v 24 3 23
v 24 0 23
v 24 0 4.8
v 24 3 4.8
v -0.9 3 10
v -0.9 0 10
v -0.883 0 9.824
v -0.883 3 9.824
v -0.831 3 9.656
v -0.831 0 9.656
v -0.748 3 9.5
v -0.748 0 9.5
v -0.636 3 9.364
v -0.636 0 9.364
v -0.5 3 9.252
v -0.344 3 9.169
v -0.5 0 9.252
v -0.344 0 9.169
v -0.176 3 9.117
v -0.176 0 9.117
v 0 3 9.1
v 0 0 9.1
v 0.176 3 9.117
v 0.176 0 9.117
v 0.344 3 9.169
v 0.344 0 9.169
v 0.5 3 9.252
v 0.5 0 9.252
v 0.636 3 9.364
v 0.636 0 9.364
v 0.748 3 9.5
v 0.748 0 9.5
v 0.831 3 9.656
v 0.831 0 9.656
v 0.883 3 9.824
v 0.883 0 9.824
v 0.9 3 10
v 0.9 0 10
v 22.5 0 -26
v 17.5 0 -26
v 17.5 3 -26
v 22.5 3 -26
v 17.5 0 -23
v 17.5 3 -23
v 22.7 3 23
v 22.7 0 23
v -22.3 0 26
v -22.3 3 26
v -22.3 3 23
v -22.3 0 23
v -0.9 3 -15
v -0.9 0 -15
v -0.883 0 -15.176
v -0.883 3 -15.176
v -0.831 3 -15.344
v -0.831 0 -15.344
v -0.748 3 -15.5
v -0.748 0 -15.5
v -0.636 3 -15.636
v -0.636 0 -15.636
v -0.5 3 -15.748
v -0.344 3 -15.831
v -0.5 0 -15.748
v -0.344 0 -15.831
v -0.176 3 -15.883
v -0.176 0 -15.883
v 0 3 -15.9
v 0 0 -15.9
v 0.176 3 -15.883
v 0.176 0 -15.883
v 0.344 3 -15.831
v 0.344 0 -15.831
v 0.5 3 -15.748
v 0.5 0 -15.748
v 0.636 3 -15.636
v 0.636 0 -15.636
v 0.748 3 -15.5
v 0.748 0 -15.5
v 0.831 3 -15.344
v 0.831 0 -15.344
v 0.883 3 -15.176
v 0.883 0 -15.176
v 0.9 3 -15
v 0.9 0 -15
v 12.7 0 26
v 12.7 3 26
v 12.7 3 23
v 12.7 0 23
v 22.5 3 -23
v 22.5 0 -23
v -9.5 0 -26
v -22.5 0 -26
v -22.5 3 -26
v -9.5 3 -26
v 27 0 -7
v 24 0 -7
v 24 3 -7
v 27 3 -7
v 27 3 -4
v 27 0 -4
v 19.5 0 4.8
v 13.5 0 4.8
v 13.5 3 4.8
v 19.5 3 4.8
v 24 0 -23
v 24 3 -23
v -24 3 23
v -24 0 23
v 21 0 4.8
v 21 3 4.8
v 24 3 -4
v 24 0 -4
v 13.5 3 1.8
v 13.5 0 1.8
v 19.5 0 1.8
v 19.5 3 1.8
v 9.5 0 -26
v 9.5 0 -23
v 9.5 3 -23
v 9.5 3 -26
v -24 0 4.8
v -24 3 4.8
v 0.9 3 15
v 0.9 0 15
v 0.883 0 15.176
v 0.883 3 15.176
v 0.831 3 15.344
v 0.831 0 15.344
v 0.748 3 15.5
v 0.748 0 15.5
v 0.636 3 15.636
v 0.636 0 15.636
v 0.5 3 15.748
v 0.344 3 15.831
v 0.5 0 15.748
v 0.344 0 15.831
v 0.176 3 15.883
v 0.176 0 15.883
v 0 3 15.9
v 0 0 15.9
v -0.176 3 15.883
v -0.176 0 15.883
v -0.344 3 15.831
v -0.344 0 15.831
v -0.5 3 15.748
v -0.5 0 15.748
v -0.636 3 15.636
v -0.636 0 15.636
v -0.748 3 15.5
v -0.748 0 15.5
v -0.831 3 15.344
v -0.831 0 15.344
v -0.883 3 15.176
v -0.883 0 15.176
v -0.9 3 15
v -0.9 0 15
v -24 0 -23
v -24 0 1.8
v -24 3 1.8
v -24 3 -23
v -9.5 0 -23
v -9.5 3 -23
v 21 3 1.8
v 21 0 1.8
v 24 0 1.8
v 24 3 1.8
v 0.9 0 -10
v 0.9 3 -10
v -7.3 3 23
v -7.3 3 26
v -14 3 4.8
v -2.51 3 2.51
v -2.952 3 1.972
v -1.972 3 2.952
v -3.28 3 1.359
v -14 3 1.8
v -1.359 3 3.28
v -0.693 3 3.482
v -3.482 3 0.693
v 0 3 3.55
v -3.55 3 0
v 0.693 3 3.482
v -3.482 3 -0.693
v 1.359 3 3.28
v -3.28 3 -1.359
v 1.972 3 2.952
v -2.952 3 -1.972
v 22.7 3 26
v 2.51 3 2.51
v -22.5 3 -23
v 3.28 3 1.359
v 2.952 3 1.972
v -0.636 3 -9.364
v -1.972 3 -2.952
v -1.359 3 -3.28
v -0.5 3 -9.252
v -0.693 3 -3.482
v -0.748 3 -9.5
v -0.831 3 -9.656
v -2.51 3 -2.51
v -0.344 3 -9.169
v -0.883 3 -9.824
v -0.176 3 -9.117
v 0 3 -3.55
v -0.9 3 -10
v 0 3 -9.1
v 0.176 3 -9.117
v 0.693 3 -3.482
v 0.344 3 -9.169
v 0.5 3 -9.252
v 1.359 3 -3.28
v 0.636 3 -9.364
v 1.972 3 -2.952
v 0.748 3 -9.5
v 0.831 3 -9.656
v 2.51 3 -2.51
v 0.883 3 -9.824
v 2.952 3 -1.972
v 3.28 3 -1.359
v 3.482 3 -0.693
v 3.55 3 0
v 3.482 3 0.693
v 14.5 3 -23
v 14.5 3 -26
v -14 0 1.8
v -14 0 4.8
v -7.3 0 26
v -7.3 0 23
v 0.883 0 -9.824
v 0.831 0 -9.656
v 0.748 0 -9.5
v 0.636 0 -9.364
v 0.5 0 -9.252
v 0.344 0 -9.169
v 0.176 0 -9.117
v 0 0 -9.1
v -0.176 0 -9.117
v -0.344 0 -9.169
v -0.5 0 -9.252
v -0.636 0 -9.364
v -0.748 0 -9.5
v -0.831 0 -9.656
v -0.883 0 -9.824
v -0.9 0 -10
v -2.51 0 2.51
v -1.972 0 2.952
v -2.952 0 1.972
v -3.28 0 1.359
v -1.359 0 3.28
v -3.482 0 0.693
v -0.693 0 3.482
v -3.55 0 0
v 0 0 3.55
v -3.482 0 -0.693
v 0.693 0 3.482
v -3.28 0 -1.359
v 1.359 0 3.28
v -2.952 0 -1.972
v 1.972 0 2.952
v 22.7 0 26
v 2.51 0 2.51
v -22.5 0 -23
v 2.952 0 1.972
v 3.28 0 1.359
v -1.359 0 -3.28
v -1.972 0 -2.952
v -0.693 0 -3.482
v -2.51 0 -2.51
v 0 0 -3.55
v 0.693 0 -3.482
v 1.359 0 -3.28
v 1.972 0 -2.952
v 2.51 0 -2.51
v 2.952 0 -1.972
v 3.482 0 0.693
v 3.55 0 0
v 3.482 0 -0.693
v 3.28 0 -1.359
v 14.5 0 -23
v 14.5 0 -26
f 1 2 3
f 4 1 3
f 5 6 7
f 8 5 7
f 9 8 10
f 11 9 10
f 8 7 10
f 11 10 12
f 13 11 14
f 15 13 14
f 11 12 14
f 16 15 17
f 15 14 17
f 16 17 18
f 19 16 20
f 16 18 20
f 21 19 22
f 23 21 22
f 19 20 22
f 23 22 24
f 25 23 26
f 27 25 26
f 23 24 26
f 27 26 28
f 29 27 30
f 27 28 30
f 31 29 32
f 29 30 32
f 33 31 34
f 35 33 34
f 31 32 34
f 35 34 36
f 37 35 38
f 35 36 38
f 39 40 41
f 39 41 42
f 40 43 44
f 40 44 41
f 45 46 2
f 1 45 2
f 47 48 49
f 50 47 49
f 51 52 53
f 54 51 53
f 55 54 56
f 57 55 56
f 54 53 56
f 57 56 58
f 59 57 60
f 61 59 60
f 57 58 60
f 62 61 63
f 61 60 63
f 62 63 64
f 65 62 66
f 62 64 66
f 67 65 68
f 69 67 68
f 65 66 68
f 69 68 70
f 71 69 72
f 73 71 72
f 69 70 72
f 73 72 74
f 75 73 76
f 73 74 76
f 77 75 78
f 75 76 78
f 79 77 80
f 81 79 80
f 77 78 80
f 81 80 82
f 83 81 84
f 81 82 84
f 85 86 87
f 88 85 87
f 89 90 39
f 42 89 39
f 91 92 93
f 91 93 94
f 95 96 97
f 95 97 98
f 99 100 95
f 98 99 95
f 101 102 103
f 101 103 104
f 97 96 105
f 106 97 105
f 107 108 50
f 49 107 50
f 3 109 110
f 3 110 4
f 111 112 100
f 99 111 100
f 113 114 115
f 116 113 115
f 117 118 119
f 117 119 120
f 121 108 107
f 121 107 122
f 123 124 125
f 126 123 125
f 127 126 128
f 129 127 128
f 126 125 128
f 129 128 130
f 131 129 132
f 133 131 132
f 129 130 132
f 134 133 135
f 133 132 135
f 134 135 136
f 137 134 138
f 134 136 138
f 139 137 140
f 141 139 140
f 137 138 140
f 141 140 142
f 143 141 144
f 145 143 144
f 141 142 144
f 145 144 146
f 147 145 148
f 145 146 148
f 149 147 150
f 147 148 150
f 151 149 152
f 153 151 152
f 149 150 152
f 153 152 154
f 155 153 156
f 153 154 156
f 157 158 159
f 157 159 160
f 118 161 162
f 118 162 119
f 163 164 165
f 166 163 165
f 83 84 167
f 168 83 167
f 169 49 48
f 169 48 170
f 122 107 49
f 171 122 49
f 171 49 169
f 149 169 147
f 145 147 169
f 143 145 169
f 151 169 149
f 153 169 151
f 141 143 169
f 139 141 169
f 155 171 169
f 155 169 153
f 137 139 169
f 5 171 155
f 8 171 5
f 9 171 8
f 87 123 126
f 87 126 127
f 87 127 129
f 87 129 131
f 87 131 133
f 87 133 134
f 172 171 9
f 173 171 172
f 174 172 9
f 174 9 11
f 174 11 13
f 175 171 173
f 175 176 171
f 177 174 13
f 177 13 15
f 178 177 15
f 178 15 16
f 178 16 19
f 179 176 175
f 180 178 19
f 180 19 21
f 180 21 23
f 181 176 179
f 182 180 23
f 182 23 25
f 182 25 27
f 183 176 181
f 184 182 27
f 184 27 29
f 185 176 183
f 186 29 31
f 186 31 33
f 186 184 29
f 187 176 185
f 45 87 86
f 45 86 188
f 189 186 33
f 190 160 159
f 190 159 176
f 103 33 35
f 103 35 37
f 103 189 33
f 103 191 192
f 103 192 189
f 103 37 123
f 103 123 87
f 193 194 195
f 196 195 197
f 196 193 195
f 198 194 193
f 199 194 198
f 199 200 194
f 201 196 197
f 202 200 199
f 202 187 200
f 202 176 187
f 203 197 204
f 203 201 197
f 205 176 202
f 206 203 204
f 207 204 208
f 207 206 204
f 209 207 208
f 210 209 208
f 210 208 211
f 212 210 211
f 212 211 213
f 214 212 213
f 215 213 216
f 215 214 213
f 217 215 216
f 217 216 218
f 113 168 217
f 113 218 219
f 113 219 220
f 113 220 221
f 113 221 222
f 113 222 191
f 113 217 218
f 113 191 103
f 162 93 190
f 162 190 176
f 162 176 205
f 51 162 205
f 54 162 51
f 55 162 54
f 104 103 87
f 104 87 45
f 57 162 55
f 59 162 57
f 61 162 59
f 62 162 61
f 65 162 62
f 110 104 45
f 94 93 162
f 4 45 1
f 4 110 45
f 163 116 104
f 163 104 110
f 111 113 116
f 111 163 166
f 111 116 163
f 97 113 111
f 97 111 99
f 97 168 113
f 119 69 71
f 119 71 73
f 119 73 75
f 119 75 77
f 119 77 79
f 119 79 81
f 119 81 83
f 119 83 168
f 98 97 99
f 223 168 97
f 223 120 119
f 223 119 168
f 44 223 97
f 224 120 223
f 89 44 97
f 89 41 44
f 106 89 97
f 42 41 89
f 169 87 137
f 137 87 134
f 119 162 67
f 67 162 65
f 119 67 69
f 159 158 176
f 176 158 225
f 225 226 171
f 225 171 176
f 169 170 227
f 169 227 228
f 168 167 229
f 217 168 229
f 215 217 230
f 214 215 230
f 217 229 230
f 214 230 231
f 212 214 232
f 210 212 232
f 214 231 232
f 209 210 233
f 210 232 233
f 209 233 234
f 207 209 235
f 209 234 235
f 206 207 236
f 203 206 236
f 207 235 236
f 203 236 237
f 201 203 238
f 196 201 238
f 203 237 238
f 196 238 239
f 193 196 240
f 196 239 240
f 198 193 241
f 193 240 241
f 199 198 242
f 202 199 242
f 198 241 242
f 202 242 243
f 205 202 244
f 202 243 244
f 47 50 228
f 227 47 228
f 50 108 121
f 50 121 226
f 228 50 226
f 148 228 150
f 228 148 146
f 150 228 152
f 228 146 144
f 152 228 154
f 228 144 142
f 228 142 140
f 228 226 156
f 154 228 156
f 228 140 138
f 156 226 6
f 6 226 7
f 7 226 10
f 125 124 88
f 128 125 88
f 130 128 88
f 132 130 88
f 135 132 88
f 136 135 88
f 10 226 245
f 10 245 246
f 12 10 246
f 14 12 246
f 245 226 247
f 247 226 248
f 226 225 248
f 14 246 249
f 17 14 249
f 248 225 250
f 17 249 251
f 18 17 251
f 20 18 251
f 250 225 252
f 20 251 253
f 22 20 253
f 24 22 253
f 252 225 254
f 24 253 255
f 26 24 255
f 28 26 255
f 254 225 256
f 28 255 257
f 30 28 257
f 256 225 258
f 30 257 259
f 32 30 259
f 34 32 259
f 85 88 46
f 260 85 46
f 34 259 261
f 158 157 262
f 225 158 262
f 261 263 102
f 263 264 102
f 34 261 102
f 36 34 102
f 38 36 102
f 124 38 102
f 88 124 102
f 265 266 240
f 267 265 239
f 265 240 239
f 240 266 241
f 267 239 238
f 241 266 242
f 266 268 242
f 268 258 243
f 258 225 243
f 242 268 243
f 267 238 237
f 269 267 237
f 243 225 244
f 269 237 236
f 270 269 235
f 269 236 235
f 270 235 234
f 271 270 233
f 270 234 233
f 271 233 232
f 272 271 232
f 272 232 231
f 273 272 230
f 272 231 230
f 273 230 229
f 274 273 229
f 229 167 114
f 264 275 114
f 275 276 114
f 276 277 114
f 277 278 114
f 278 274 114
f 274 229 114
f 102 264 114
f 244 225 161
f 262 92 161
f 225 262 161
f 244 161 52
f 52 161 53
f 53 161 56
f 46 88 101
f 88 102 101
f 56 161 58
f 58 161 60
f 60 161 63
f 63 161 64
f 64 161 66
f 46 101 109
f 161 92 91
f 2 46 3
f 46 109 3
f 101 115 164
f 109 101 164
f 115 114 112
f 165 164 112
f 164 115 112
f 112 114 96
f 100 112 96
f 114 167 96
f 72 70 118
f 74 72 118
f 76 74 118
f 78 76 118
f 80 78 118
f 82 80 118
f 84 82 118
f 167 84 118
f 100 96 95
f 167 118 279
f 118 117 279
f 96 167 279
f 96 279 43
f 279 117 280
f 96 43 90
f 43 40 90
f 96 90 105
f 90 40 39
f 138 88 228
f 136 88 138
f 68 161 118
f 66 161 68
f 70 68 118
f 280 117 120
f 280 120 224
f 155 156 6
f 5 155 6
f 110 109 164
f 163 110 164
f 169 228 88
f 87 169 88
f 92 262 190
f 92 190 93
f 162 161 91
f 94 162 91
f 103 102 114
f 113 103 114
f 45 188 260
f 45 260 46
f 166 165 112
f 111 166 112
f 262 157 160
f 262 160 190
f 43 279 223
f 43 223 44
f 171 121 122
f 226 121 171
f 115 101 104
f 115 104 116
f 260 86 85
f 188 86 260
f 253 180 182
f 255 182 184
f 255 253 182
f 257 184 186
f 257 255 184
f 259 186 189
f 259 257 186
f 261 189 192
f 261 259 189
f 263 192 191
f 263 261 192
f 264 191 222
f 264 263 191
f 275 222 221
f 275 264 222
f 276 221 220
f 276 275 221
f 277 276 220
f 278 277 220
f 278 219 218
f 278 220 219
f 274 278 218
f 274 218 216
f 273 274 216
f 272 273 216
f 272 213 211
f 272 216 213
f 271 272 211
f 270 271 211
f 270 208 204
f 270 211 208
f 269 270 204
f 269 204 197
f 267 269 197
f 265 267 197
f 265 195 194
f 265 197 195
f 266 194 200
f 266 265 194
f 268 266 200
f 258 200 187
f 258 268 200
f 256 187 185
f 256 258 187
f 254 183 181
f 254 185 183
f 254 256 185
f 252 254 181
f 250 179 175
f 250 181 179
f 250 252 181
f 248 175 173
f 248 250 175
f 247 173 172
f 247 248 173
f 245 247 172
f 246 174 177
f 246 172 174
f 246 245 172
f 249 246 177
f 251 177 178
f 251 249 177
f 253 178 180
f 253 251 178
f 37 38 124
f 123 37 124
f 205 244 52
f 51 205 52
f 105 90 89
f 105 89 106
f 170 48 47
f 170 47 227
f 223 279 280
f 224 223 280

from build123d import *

# Parameters (mm, degrees)
ESBO_O1_W                = 48
ESBO_O1_H                = 46
RESSALTO_EXTRUS_O1_DEPTH = 3
ESBO_O6_W                = 3
ESBO_O6_H                = 3
RESSALTO_EXTRUS_O4_DEPTH = 3
ESBO_O2_R                = 3.55
CORTE_EXTRUS_O1_DEPTH    = 36.594943461
CORTE_EXTRUS_O2_DEPTH    = 36.594943461
PADR_OCIRCULAR1_COUNT    = 2
ESBO_O4_W                = 10
ESBO_O4_H                = 3
ESBO_O4_W_2              = 15
RESSALTO_EXTRUS_O2_DEPTH = 3
ESBO_O5_W                = 5
ESBO_O5_H                = 3
ESBO_O5_W_2              = 13
RESSALTO_EXTRUS_O3_DEPTH = 3
ESBO_O7_W                = 3
ESBO_O7_H                = 3
ESBO_O7_W_2              = 6
ESBO_O7_W_3              = 10
CORTE_EXTRUS_O3_DEPTH    = 38.603191354


with BuildPart() as part:
    # Esboço1 → Ressalto-extrusão1 (new body)
    with BuildSketch(Plane(origin=(0, 0, 0), x_dir=(1, 0, 0), z_dir=(0, 1, 0))):
        Rectangle(ESBO_O1_W, ESBO_O1_H)
    extrude(amount=RESSALTO_EXTRUS_O1_DEPTH)

    # Esboço6 → Ressalto-extrusão4 (add, through all)
    with BuildSketch(Plane(origin=(0, 0, 0), x_dir=(1, 0, 0), z_dir=(0, 1, 0))):
        with Locations((25.5, 5.5)):
            Rectangle(ESBO_O6_W, ESBO_O6_H)
    extrude(amount=RESSALTO_EXTRUS_O4_DEPTH)

    # Esboço2 → Corte-extrusão1 (cut, through all)
    with BuildSketch(Plane(origin=(0, 0, 0), x_dir=(1, 0, 0), z_dir=(0, 1, 0))):
        with Locations(Location((0, 0, 0), (0, 0, 270))):
            Circle(ESBO_O2_R)
    extrude(amount=CORTE_EXTRUS_O1_DEPTH, mode=Mode.SUBTRACT)

    # Esboço3 → Corte-extrusão2 (cut, through all)
    with BuildSketch(Plane(origin=(0, 0, 0), x_dir=(1, 0, 0), z_dir=(0, 1, 0))):
        with BuildLine():
            Line((-0.9, 10), (-0.9, 15))
            ThreePointArc((-0.9, 15), (0, 15.9), (0.9, 15))
            Line((0.9, 15), (0.9, 10))
            ThreePointArc((0.9, 10), (0, 9.1), (-0.9, 10))
        make_face()
    corte_extrus_o2 = extrude(amount=CORTE_EXTRUS_O2_DEPTH, mode=Mode.SUBTRACT)

    # PadrãoCircular1: Corte-extrusão2 ×2 about axis
    padr_ocircular1_axis = Axis((0, 0, 0), (0, 1, 0))
    for i in range(1, PADR_OCIRCULAR1_COUNT):
        add(corte_extrus_o2.rotate(padr_ocircular1_axis, i * 360 / PADR_OCIRCULAR1_COUNT), mode=Mode.SUBTRACT)

    # Esboço4 → Ressalto-extrusão2 (add, through all)
    with BuildSketch(Plane(origin=(0, 3, 0), x_dir=(1, 0, 0), z_dir=(0, 1, 0))):
        with Locations((17.7, -24.5)):
            Rectangle(ESBO_O4_W, ESBO_O4_H)
        with Locations((-14.8, -24.5)):
            Rectangle(ESBO_O4_W_2, ESBO_O4_H)
    extrude(amount=-RESSALTO_EXTRUS_O2_DEPTH)

    # Esboço5 → Ressalto-extrusão3 (add, through all)
    with BuildSketch(Plane(origin=(0, 0, 0), x_dir=(1, 0, 0), z_dir=(0, 1, 0))):
        with Locations((20, 24.5)):
            Rectangle(ESBO_O5_W, ESBO_O5_H)
        with Locations((12, 24.5)):
            Rectangle(ESBO_O5_W, ESBO_O5_H)
        with Locations((-16, 24.5)):
            Rectangle(ESBO_O5_W_2, ESBO_O5_H)
    extrude(amount=RESSALTO_EXTRUS_O3_DEPTH)

    # Esboço7 → Corte-extrusão3 (cut, through all)
    with BuildSketch(Plane(origin=(0, 0, 0), x_dir=(1, 0, 0), z_dir=(0, 1, 0))):
        with Locations((22.5, -3.3)):
            Rectangle(ESBO_O7_W, ESBO_O7_H)
        with Locations((16.5, -3.3)):
            Rectangle(ESBO_O7_W_2, ESBO_O7_H)
        with Locations((-19, -3.3)):
            Rectangle(ESBO_O7_W_3, ESBO_O7_H)
    extrude(amount=CORTE_EXTRUS_O3_DEPTH, mode=Mode.SUBTRACT)


solid = part.part
